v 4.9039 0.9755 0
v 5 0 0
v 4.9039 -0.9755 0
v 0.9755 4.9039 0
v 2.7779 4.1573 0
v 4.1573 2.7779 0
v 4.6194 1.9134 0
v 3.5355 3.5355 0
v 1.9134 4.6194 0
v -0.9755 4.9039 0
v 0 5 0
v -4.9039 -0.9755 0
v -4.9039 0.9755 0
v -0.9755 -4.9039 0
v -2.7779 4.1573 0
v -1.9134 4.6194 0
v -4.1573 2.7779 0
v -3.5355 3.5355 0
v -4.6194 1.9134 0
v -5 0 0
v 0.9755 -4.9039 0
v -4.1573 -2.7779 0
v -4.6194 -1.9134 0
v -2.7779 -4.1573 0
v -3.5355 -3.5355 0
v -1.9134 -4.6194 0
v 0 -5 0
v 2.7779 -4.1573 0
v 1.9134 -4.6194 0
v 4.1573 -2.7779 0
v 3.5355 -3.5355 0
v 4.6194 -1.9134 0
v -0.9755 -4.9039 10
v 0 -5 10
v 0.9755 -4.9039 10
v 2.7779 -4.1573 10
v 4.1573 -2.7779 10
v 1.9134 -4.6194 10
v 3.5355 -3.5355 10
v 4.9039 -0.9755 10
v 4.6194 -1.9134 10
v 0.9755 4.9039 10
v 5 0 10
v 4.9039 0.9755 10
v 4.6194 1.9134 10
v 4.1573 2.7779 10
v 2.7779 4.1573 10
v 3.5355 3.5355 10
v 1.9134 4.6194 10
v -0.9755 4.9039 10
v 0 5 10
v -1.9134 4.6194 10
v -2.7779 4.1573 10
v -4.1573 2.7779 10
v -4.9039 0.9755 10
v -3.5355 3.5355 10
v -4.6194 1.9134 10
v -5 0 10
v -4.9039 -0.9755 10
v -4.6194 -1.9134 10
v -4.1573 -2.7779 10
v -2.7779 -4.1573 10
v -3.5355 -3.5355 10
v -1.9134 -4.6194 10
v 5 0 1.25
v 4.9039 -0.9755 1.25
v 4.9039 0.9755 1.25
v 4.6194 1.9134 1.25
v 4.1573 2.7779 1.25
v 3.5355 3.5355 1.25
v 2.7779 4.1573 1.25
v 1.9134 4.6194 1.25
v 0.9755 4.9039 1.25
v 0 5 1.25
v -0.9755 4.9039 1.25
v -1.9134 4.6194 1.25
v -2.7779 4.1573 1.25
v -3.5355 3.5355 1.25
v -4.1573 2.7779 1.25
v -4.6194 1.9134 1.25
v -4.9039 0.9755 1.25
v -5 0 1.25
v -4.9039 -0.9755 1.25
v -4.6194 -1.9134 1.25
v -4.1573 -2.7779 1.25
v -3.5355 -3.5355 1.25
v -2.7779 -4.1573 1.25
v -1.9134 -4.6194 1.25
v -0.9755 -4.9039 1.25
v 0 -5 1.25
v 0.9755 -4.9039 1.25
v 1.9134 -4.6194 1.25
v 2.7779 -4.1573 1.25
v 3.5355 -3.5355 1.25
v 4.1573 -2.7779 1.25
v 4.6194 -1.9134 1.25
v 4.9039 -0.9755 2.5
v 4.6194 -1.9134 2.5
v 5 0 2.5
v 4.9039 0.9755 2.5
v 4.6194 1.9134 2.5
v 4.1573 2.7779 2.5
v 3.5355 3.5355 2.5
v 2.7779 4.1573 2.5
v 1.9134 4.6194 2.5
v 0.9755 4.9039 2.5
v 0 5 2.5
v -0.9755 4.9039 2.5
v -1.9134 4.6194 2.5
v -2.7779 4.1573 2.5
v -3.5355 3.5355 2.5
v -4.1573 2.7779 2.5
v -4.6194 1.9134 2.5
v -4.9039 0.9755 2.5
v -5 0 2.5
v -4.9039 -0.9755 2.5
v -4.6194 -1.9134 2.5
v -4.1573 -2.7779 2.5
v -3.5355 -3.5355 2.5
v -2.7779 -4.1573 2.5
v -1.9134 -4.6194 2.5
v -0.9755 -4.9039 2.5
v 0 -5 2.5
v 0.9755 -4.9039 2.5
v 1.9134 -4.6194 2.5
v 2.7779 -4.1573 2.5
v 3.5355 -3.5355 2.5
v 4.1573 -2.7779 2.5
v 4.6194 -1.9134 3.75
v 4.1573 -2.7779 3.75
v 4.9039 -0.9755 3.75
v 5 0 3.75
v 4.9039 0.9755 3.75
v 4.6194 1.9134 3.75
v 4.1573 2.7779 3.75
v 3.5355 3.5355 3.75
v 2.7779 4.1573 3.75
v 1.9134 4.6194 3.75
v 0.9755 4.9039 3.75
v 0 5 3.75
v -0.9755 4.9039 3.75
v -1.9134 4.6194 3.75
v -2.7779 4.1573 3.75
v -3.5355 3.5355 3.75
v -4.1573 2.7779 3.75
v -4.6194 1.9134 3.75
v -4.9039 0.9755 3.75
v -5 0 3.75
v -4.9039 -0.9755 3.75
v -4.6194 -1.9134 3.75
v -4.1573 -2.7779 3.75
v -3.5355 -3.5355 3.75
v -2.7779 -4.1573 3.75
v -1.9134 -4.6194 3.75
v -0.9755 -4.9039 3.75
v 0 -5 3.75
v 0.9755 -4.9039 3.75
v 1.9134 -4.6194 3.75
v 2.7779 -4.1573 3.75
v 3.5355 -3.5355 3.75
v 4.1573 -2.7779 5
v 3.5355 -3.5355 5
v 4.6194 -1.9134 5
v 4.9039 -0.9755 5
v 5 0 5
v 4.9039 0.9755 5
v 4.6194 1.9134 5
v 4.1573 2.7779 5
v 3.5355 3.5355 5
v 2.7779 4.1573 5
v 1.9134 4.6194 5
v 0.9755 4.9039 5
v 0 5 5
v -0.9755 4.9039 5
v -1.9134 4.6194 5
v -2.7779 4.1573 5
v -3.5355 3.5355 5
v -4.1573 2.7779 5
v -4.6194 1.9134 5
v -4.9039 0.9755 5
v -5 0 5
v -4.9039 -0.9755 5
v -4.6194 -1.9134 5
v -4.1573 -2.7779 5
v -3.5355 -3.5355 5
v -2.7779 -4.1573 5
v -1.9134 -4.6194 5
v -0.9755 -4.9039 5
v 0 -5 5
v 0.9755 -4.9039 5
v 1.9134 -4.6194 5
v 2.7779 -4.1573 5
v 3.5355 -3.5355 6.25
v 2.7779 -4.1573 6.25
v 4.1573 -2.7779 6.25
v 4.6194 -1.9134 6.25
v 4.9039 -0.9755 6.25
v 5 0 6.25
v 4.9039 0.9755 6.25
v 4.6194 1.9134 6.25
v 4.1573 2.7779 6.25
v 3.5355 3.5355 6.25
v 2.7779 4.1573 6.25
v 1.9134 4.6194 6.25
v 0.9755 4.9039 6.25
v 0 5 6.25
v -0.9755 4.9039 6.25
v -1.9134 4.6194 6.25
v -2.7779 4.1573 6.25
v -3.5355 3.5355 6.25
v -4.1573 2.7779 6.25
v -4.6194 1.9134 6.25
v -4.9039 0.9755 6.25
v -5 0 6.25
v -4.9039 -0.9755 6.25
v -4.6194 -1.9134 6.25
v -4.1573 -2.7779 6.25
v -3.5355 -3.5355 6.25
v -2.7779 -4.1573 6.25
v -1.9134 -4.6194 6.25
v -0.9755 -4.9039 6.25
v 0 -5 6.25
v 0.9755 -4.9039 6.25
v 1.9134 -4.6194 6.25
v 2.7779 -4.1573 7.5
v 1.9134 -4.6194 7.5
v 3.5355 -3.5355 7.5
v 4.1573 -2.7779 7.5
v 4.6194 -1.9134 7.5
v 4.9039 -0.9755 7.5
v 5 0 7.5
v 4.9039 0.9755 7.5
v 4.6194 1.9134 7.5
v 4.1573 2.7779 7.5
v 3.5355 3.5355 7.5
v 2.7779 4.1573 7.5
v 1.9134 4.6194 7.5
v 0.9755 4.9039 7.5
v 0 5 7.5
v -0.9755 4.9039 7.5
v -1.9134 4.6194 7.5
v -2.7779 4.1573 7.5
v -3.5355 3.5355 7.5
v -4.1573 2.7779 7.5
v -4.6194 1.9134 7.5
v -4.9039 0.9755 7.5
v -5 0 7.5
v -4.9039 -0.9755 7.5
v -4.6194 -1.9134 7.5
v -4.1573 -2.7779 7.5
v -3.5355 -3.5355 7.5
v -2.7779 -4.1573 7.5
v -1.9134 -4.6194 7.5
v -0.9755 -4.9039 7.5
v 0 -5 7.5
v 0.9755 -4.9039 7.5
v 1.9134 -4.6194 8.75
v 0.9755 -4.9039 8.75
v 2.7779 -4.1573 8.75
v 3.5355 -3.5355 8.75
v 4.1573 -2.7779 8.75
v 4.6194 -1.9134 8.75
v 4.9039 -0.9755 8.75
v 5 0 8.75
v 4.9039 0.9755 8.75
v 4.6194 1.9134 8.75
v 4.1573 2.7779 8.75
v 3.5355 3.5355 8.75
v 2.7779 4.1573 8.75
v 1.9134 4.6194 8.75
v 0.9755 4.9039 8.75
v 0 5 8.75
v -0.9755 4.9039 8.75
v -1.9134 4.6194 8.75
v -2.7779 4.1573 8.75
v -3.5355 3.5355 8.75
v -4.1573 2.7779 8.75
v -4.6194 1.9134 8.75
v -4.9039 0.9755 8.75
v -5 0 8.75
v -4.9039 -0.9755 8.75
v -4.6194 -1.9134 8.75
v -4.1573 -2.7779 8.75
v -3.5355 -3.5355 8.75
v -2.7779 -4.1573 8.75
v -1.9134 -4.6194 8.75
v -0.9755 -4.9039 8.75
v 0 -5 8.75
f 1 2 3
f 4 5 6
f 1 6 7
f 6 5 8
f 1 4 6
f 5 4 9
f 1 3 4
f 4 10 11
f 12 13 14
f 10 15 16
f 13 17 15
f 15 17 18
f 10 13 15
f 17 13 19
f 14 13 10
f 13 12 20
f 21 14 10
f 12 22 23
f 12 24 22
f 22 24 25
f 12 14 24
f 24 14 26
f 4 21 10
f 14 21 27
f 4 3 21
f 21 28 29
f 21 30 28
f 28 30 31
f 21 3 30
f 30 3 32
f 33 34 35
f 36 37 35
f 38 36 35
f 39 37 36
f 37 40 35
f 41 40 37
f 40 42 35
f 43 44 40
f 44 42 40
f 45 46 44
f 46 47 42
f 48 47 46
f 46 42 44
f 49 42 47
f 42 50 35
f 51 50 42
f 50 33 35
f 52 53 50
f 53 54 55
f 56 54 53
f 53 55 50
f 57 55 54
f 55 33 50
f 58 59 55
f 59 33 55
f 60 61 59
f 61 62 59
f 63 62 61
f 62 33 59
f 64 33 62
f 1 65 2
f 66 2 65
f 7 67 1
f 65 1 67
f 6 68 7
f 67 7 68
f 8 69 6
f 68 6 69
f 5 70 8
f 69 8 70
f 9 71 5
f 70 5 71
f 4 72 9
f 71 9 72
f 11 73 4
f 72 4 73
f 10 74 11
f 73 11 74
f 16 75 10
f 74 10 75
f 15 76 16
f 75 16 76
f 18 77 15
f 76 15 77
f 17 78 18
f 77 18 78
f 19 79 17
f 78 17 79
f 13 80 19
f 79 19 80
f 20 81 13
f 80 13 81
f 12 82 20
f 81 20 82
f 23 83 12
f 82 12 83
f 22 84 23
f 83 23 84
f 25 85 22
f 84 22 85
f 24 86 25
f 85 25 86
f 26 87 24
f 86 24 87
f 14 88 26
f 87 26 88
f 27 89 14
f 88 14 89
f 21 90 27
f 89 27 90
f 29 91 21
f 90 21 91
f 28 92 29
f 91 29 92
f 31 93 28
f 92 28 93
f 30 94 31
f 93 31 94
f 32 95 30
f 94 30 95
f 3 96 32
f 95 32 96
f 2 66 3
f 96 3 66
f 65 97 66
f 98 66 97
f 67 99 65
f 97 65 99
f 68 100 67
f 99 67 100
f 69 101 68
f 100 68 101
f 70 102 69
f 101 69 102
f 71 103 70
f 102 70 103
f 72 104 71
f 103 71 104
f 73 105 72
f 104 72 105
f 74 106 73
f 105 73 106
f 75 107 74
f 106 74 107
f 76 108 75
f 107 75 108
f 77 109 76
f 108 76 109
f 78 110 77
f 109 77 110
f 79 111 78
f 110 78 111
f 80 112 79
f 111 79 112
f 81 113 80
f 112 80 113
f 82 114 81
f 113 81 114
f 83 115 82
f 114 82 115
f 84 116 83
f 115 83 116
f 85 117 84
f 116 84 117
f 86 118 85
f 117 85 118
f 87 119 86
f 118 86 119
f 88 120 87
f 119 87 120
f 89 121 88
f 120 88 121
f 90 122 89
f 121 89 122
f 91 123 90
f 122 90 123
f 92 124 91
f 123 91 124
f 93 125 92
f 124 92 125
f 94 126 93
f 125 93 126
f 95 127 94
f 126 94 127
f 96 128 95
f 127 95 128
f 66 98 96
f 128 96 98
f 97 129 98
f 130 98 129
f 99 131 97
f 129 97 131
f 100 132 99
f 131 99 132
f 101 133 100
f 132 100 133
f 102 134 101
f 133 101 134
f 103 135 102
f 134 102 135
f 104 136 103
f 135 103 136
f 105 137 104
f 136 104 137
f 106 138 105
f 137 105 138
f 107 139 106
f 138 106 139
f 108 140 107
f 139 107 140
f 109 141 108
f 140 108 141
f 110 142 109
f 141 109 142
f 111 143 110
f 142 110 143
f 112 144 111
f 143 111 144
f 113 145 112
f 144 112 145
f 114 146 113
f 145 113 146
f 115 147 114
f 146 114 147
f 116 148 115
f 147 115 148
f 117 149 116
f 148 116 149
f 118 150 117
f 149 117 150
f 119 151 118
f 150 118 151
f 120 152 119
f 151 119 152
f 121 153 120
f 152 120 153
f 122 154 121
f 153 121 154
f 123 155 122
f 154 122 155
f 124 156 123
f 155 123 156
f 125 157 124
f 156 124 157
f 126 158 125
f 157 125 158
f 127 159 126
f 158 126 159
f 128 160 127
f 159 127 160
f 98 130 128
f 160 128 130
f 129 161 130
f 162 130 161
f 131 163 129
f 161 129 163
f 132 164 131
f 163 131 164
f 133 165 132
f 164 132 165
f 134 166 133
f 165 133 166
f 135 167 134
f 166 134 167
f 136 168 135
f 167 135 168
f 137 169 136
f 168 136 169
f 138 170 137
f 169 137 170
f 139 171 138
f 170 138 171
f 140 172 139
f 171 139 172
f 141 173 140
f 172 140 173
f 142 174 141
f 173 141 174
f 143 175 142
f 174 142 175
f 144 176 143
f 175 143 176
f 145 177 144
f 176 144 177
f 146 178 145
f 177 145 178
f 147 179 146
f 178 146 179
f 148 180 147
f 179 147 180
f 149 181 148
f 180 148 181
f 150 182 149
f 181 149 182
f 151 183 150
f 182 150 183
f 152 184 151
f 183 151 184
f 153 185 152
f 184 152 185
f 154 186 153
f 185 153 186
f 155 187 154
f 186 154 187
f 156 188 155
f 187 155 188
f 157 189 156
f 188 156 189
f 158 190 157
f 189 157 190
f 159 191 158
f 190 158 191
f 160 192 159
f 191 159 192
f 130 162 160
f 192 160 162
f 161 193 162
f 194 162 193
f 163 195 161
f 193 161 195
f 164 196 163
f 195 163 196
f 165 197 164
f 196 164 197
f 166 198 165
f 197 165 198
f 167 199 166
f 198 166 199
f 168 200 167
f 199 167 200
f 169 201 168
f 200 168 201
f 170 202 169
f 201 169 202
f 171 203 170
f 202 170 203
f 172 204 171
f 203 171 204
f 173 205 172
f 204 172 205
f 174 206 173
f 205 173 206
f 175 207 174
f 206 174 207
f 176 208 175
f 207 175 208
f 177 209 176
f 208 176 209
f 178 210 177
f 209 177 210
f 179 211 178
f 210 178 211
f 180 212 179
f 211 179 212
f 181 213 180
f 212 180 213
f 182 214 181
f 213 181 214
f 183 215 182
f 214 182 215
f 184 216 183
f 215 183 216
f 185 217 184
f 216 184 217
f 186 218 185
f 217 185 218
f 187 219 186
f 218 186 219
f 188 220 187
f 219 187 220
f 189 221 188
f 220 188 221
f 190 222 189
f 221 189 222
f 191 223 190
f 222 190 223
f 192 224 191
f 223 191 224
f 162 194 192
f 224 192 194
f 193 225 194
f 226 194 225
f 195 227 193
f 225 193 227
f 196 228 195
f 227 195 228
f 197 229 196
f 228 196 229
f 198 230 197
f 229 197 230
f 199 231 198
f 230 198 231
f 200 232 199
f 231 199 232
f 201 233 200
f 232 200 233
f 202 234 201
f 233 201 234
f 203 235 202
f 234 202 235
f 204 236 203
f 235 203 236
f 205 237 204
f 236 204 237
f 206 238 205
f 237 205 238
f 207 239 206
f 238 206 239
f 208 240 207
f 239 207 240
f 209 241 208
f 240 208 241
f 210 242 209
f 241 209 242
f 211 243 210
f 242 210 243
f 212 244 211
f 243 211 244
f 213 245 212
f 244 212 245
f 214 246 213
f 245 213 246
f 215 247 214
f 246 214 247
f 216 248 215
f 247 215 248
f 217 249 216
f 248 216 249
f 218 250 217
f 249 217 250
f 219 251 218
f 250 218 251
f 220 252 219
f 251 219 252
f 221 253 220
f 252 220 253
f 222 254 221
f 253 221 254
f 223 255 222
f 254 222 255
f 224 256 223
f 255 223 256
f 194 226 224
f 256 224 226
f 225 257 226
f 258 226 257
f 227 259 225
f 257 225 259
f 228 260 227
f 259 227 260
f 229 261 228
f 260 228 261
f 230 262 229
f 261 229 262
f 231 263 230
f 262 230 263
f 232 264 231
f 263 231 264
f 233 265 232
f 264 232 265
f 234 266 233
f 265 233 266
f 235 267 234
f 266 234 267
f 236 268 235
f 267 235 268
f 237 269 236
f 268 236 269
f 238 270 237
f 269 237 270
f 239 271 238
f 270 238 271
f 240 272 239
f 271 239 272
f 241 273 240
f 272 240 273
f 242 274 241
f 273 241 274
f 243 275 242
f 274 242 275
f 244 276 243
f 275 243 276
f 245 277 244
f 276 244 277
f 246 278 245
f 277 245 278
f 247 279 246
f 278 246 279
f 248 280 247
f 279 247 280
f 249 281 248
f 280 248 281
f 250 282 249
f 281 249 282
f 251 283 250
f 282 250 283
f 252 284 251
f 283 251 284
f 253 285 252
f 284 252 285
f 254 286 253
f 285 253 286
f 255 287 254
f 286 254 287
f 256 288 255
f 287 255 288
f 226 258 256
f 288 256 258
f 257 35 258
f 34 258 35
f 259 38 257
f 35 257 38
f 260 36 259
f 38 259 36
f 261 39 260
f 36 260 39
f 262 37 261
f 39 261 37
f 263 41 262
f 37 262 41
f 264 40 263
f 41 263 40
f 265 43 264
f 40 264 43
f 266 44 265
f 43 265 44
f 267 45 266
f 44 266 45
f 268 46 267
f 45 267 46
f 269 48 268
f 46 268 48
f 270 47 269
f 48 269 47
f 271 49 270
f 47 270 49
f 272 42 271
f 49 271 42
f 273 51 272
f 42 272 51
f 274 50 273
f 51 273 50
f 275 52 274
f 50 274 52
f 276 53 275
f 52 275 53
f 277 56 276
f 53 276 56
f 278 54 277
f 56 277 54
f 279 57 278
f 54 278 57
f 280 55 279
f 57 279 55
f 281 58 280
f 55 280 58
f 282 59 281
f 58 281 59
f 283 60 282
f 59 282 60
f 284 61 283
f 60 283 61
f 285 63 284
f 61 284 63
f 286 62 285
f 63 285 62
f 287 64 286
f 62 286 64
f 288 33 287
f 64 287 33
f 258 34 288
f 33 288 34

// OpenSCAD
// A 32-gon twisted by exactly one vertex step per slice is still a prism. Only
// one of the two wall-quad diagonals reproduces that; the other cuts ~1.3% off.
$fn = 32;
linear_extrude(height=10, twist=90) circle(5);
